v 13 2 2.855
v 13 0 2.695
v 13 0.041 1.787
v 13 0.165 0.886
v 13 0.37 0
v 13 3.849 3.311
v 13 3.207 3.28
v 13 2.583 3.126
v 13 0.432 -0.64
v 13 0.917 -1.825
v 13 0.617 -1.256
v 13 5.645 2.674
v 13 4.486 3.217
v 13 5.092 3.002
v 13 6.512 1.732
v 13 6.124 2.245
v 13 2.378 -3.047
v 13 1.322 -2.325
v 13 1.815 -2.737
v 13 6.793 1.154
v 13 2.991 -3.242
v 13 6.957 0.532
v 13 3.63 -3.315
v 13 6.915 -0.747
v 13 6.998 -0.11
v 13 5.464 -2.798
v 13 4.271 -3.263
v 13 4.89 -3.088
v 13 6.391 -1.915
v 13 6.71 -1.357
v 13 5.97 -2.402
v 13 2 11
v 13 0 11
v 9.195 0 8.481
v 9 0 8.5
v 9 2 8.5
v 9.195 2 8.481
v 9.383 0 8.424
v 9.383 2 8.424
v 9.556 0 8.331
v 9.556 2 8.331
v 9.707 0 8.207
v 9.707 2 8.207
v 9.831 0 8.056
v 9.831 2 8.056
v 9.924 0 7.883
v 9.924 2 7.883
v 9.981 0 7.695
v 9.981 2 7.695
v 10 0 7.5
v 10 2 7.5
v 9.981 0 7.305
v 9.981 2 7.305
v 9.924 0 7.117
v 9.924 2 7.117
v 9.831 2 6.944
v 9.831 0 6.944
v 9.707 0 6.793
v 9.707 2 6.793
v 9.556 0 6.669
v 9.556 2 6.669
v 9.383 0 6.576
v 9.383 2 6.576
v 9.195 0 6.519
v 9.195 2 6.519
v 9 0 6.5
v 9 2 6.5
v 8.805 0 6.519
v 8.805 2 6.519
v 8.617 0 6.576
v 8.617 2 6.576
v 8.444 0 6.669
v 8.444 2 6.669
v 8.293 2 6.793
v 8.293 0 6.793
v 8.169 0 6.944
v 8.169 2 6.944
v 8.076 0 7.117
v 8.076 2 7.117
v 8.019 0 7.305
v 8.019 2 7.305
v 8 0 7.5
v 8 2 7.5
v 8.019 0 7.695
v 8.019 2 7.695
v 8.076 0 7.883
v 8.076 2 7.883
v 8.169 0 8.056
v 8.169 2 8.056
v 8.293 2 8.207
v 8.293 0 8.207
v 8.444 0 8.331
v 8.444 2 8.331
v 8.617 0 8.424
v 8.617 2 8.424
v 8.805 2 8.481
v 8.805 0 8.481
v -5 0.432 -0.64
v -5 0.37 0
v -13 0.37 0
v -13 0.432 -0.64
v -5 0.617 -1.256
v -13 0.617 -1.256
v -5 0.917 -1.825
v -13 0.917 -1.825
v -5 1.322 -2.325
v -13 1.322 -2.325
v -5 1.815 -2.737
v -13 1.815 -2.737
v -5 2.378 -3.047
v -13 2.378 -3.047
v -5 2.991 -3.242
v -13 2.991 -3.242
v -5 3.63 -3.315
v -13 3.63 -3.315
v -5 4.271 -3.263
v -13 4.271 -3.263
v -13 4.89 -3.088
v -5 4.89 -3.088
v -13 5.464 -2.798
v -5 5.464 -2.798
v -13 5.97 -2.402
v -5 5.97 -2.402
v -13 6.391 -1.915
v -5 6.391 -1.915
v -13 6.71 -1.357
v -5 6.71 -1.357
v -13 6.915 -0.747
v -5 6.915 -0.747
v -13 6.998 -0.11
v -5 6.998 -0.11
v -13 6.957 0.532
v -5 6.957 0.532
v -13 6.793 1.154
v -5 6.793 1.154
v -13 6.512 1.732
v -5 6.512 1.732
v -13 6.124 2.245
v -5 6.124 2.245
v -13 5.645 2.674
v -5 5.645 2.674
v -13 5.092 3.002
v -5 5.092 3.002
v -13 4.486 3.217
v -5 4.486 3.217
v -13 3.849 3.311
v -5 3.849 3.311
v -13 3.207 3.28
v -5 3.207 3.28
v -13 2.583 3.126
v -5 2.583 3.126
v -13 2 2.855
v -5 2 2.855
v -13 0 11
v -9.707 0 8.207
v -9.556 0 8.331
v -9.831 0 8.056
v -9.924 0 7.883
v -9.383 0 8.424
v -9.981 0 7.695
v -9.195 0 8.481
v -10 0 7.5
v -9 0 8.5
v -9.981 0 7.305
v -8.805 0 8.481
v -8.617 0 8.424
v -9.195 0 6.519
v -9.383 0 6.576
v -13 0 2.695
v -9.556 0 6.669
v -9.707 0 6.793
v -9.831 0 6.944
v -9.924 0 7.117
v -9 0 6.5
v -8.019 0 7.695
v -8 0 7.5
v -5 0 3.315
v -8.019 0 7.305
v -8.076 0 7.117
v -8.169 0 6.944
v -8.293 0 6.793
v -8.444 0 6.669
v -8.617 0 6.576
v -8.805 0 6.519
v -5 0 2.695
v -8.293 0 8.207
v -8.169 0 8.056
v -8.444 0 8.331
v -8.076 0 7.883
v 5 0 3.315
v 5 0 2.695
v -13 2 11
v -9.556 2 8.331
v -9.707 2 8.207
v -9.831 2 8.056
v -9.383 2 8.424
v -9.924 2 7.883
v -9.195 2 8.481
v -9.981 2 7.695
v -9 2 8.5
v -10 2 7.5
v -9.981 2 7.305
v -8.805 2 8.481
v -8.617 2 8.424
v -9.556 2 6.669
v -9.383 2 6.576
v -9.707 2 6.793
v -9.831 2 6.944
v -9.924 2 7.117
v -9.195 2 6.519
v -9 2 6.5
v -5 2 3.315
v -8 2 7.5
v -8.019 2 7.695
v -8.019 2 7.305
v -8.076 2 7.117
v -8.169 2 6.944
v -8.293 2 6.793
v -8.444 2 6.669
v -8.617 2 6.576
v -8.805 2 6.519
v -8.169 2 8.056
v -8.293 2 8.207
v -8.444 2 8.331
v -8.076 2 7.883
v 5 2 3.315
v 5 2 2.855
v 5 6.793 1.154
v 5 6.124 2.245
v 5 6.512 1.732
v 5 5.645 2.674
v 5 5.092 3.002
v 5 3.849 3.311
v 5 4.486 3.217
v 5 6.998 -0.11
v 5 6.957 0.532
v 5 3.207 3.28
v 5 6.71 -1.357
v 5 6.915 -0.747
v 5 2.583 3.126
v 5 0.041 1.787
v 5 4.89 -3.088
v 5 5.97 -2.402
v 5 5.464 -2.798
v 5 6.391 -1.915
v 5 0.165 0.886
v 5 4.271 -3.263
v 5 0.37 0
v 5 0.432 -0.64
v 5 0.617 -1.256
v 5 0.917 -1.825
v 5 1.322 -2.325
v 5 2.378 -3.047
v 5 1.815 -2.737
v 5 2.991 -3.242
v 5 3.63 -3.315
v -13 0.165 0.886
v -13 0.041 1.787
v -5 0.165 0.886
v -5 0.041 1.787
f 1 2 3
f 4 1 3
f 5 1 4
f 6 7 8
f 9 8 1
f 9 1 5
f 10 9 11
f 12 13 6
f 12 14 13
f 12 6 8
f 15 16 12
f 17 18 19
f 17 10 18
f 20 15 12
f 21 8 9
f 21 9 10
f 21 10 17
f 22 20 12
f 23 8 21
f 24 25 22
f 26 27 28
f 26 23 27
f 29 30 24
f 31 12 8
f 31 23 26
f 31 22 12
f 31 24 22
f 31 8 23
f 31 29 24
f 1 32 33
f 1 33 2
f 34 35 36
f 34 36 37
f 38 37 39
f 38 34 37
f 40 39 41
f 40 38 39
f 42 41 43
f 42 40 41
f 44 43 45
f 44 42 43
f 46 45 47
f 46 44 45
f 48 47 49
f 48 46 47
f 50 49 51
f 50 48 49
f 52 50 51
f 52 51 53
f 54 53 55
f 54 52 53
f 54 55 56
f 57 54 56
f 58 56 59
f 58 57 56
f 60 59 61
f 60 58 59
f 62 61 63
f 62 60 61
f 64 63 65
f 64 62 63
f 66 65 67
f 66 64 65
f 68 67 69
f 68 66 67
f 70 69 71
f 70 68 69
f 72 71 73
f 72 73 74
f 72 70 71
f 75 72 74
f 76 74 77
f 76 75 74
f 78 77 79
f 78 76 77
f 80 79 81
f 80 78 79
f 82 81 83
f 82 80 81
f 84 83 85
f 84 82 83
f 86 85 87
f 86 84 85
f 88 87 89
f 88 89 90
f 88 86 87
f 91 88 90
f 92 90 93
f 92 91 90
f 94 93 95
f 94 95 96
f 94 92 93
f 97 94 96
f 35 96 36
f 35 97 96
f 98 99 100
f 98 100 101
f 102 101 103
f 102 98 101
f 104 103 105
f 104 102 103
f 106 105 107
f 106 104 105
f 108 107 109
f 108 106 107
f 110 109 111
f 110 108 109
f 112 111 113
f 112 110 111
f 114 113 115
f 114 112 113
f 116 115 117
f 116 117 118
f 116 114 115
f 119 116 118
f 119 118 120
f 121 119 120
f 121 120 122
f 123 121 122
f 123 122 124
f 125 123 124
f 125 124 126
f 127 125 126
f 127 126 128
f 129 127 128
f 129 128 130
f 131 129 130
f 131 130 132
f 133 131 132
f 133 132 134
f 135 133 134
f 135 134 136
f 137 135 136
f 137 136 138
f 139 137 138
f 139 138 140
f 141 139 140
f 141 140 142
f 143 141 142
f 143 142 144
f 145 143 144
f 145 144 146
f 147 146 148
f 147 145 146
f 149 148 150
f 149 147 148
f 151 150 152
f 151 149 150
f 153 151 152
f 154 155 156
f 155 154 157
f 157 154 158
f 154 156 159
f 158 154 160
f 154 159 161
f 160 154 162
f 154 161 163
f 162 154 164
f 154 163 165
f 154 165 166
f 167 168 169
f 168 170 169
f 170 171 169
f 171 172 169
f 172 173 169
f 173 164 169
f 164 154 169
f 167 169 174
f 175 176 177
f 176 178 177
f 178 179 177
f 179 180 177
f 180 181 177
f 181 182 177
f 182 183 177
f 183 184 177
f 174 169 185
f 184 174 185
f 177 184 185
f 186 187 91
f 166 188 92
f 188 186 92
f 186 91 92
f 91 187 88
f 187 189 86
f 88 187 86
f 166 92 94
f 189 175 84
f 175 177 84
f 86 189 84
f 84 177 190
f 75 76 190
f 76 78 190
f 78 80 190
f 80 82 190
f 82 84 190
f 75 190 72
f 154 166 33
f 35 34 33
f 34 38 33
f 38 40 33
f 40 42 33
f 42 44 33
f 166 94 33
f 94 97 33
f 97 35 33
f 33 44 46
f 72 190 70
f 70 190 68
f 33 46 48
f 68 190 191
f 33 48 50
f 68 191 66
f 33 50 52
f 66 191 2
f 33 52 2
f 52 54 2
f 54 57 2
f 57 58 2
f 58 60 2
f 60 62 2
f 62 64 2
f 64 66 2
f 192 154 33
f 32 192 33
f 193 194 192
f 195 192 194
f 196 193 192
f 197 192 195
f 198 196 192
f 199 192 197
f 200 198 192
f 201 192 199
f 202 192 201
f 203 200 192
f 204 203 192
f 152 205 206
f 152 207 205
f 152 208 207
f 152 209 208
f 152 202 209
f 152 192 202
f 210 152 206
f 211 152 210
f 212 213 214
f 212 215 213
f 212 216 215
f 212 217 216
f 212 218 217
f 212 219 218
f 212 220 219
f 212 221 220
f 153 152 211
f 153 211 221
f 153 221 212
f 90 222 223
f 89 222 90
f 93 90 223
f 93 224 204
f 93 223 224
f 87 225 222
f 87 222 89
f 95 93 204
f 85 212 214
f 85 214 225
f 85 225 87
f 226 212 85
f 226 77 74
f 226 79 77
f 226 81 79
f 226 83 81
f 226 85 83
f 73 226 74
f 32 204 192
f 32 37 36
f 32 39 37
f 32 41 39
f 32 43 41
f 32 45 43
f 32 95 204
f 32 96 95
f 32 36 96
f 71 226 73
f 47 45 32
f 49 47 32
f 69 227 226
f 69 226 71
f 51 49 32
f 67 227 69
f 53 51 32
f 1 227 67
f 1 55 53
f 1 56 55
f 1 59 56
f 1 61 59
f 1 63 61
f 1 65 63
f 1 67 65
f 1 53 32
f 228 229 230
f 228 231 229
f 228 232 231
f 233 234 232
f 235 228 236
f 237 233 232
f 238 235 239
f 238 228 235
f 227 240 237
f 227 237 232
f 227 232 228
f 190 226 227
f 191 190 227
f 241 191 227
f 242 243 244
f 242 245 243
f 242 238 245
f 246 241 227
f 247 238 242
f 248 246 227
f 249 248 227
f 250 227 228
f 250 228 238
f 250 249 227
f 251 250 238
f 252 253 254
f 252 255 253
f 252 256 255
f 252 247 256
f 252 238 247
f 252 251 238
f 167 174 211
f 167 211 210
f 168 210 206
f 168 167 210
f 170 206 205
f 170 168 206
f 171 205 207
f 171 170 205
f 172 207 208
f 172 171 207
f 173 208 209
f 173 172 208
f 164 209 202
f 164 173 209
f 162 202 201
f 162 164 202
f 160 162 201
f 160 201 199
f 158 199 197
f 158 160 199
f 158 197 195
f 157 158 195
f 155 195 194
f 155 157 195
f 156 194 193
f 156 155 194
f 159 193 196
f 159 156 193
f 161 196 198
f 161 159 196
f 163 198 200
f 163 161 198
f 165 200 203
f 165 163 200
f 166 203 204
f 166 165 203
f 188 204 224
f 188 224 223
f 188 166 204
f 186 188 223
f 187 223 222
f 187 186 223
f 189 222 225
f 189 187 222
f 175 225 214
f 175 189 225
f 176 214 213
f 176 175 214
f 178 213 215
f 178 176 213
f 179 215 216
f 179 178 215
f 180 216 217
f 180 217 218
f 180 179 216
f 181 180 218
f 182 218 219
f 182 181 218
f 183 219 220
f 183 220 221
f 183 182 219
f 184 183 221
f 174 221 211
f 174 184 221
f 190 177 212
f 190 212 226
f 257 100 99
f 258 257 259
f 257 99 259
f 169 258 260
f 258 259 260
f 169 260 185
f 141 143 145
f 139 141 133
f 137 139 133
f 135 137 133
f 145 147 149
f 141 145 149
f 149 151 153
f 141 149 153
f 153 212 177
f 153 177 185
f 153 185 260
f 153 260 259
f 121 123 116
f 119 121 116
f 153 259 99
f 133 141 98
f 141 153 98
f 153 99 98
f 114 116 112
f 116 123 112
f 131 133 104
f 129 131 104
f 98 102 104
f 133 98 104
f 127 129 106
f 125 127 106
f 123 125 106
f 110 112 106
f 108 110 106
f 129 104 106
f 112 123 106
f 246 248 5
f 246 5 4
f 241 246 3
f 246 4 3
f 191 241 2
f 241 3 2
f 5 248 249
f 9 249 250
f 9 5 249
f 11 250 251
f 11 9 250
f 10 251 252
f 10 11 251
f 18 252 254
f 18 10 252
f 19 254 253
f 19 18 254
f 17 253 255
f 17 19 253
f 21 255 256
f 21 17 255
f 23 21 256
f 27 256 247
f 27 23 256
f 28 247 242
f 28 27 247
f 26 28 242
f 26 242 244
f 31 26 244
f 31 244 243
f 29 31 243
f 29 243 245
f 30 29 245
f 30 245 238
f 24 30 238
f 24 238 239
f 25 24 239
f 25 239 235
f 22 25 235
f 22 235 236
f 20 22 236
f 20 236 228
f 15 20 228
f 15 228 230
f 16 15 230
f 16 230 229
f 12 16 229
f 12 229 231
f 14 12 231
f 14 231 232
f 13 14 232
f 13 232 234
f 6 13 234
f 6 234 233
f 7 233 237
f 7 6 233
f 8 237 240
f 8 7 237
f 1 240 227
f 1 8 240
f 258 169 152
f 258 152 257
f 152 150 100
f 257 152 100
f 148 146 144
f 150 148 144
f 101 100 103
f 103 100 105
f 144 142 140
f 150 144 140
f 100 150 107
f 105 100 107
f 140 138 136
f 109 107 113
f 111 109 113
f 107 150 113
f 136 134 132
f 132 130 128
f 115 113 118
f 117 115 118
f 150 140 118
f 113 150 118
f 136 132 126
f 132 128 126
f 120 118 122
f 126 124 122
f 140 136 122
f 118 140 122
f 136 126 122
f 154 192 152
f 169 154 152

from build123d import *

# Parameters (mm, degrees)
SKETCH_1_W               = 26
SKETCH_1_H               = 11
SKETCH_1_R               = 1
EXTRUDE_1_DEPTH          = 2
SKETCH_2_R               = 3.315
EXTRUDE_2_DEPTH          = 26
FILLET_1_R               = 10
CUT_EXTRUDE_1_DEPTH      = 18.748239349
CUT_EXTRUDE_1_DEPTH_BACK = 18.748239349
SKETCH_3_W               = 10
SKETCH_3_H               = 7


with BuildPart() as part:
    # 草图1 → 凸台-拉伸1 (new body)
    with BuildSketch(Plane(origin=(0, 0, 0), x_dir=(1, 0, 0), z_dir=(0, 1, 0))):
        with Locations((0, -5.5)):
            Rectangle(SKETCH_1_W, SKETCH_1_H)
        with Locations(Location((9, -7.5, 0), (0, 0, 270))):
            Circle(SKETCH_1_R, mode=Mode.SUBTRACT)
        with Locations(Location((-9, -7.5, 0), (0, 0, 90))):
            Circle(SKETCH_1_R, mode=Mode.SUBTRACT)
    extrude(amount=EXTRUDE_1_DEPTH)

    # 草图2 → 凸台-拉伸2 (add)
    with BuildSketch(Plane(origin=(13, 0, 0), x_dir=(0, 0, -1), z_dir=(1, 0, 0))):
        with Locations((0, 3.685)):
            Circle(SKETCH_2_R)
    extrude(amount=-EXTRUDE_2_DEPTH)

    # 圆角1
    # the kernel refuses this fillet: 10 mm, written as the material it takes off along each edge
    with BuildSketch(Plane(origin=(19.737534787, 0, 0), x_dir=(0, 1, 0), z_dir=(-1, 0, 0))) as fillet_1_piece_1:
        with BuildLine():
            CenterArc((10, -2.695013915), FILLET_1_R, 164.365401099, 15.634598901)
            Line((0, -2.695013915), (-0.2, -2.695013915))
            Line((-0.2, -2.695013915), (-0.2, 0))
            Line((-0.2, 0), (0, 0.2))
            ThreePointArc((0, 0.2), (0.185, 0.2), (0.1774, 0.053900278))
            Line((0.1774, 0.053900278), (0.37, 0))
        make_face()
    extrude(amount=39.475069573, mode=Mode.SUBTRACT)

    # 草图3 → 切除-拉伸1 (cut, two sides: drawn at the far end of the back side and taken through both)
    with BuildSketch(Plane(origin=(0, 2, 0), x_dir=(1, 0, 0), z_dir=(0, 1, 0)).offset(-CUT_EXTRUDE_1_DEPTH_BACK)):
        with Locations((0, 0.185)):
            Rectangle(SKETCH_3_W, SKETCH_3_H)
    extrude(amount=CUT_EXTRUDE_1_DEPTH + CUT_EXTRUDE_1_DEPTH_BACK, mode=Mode.SUBTRACT)


solid = part.part
